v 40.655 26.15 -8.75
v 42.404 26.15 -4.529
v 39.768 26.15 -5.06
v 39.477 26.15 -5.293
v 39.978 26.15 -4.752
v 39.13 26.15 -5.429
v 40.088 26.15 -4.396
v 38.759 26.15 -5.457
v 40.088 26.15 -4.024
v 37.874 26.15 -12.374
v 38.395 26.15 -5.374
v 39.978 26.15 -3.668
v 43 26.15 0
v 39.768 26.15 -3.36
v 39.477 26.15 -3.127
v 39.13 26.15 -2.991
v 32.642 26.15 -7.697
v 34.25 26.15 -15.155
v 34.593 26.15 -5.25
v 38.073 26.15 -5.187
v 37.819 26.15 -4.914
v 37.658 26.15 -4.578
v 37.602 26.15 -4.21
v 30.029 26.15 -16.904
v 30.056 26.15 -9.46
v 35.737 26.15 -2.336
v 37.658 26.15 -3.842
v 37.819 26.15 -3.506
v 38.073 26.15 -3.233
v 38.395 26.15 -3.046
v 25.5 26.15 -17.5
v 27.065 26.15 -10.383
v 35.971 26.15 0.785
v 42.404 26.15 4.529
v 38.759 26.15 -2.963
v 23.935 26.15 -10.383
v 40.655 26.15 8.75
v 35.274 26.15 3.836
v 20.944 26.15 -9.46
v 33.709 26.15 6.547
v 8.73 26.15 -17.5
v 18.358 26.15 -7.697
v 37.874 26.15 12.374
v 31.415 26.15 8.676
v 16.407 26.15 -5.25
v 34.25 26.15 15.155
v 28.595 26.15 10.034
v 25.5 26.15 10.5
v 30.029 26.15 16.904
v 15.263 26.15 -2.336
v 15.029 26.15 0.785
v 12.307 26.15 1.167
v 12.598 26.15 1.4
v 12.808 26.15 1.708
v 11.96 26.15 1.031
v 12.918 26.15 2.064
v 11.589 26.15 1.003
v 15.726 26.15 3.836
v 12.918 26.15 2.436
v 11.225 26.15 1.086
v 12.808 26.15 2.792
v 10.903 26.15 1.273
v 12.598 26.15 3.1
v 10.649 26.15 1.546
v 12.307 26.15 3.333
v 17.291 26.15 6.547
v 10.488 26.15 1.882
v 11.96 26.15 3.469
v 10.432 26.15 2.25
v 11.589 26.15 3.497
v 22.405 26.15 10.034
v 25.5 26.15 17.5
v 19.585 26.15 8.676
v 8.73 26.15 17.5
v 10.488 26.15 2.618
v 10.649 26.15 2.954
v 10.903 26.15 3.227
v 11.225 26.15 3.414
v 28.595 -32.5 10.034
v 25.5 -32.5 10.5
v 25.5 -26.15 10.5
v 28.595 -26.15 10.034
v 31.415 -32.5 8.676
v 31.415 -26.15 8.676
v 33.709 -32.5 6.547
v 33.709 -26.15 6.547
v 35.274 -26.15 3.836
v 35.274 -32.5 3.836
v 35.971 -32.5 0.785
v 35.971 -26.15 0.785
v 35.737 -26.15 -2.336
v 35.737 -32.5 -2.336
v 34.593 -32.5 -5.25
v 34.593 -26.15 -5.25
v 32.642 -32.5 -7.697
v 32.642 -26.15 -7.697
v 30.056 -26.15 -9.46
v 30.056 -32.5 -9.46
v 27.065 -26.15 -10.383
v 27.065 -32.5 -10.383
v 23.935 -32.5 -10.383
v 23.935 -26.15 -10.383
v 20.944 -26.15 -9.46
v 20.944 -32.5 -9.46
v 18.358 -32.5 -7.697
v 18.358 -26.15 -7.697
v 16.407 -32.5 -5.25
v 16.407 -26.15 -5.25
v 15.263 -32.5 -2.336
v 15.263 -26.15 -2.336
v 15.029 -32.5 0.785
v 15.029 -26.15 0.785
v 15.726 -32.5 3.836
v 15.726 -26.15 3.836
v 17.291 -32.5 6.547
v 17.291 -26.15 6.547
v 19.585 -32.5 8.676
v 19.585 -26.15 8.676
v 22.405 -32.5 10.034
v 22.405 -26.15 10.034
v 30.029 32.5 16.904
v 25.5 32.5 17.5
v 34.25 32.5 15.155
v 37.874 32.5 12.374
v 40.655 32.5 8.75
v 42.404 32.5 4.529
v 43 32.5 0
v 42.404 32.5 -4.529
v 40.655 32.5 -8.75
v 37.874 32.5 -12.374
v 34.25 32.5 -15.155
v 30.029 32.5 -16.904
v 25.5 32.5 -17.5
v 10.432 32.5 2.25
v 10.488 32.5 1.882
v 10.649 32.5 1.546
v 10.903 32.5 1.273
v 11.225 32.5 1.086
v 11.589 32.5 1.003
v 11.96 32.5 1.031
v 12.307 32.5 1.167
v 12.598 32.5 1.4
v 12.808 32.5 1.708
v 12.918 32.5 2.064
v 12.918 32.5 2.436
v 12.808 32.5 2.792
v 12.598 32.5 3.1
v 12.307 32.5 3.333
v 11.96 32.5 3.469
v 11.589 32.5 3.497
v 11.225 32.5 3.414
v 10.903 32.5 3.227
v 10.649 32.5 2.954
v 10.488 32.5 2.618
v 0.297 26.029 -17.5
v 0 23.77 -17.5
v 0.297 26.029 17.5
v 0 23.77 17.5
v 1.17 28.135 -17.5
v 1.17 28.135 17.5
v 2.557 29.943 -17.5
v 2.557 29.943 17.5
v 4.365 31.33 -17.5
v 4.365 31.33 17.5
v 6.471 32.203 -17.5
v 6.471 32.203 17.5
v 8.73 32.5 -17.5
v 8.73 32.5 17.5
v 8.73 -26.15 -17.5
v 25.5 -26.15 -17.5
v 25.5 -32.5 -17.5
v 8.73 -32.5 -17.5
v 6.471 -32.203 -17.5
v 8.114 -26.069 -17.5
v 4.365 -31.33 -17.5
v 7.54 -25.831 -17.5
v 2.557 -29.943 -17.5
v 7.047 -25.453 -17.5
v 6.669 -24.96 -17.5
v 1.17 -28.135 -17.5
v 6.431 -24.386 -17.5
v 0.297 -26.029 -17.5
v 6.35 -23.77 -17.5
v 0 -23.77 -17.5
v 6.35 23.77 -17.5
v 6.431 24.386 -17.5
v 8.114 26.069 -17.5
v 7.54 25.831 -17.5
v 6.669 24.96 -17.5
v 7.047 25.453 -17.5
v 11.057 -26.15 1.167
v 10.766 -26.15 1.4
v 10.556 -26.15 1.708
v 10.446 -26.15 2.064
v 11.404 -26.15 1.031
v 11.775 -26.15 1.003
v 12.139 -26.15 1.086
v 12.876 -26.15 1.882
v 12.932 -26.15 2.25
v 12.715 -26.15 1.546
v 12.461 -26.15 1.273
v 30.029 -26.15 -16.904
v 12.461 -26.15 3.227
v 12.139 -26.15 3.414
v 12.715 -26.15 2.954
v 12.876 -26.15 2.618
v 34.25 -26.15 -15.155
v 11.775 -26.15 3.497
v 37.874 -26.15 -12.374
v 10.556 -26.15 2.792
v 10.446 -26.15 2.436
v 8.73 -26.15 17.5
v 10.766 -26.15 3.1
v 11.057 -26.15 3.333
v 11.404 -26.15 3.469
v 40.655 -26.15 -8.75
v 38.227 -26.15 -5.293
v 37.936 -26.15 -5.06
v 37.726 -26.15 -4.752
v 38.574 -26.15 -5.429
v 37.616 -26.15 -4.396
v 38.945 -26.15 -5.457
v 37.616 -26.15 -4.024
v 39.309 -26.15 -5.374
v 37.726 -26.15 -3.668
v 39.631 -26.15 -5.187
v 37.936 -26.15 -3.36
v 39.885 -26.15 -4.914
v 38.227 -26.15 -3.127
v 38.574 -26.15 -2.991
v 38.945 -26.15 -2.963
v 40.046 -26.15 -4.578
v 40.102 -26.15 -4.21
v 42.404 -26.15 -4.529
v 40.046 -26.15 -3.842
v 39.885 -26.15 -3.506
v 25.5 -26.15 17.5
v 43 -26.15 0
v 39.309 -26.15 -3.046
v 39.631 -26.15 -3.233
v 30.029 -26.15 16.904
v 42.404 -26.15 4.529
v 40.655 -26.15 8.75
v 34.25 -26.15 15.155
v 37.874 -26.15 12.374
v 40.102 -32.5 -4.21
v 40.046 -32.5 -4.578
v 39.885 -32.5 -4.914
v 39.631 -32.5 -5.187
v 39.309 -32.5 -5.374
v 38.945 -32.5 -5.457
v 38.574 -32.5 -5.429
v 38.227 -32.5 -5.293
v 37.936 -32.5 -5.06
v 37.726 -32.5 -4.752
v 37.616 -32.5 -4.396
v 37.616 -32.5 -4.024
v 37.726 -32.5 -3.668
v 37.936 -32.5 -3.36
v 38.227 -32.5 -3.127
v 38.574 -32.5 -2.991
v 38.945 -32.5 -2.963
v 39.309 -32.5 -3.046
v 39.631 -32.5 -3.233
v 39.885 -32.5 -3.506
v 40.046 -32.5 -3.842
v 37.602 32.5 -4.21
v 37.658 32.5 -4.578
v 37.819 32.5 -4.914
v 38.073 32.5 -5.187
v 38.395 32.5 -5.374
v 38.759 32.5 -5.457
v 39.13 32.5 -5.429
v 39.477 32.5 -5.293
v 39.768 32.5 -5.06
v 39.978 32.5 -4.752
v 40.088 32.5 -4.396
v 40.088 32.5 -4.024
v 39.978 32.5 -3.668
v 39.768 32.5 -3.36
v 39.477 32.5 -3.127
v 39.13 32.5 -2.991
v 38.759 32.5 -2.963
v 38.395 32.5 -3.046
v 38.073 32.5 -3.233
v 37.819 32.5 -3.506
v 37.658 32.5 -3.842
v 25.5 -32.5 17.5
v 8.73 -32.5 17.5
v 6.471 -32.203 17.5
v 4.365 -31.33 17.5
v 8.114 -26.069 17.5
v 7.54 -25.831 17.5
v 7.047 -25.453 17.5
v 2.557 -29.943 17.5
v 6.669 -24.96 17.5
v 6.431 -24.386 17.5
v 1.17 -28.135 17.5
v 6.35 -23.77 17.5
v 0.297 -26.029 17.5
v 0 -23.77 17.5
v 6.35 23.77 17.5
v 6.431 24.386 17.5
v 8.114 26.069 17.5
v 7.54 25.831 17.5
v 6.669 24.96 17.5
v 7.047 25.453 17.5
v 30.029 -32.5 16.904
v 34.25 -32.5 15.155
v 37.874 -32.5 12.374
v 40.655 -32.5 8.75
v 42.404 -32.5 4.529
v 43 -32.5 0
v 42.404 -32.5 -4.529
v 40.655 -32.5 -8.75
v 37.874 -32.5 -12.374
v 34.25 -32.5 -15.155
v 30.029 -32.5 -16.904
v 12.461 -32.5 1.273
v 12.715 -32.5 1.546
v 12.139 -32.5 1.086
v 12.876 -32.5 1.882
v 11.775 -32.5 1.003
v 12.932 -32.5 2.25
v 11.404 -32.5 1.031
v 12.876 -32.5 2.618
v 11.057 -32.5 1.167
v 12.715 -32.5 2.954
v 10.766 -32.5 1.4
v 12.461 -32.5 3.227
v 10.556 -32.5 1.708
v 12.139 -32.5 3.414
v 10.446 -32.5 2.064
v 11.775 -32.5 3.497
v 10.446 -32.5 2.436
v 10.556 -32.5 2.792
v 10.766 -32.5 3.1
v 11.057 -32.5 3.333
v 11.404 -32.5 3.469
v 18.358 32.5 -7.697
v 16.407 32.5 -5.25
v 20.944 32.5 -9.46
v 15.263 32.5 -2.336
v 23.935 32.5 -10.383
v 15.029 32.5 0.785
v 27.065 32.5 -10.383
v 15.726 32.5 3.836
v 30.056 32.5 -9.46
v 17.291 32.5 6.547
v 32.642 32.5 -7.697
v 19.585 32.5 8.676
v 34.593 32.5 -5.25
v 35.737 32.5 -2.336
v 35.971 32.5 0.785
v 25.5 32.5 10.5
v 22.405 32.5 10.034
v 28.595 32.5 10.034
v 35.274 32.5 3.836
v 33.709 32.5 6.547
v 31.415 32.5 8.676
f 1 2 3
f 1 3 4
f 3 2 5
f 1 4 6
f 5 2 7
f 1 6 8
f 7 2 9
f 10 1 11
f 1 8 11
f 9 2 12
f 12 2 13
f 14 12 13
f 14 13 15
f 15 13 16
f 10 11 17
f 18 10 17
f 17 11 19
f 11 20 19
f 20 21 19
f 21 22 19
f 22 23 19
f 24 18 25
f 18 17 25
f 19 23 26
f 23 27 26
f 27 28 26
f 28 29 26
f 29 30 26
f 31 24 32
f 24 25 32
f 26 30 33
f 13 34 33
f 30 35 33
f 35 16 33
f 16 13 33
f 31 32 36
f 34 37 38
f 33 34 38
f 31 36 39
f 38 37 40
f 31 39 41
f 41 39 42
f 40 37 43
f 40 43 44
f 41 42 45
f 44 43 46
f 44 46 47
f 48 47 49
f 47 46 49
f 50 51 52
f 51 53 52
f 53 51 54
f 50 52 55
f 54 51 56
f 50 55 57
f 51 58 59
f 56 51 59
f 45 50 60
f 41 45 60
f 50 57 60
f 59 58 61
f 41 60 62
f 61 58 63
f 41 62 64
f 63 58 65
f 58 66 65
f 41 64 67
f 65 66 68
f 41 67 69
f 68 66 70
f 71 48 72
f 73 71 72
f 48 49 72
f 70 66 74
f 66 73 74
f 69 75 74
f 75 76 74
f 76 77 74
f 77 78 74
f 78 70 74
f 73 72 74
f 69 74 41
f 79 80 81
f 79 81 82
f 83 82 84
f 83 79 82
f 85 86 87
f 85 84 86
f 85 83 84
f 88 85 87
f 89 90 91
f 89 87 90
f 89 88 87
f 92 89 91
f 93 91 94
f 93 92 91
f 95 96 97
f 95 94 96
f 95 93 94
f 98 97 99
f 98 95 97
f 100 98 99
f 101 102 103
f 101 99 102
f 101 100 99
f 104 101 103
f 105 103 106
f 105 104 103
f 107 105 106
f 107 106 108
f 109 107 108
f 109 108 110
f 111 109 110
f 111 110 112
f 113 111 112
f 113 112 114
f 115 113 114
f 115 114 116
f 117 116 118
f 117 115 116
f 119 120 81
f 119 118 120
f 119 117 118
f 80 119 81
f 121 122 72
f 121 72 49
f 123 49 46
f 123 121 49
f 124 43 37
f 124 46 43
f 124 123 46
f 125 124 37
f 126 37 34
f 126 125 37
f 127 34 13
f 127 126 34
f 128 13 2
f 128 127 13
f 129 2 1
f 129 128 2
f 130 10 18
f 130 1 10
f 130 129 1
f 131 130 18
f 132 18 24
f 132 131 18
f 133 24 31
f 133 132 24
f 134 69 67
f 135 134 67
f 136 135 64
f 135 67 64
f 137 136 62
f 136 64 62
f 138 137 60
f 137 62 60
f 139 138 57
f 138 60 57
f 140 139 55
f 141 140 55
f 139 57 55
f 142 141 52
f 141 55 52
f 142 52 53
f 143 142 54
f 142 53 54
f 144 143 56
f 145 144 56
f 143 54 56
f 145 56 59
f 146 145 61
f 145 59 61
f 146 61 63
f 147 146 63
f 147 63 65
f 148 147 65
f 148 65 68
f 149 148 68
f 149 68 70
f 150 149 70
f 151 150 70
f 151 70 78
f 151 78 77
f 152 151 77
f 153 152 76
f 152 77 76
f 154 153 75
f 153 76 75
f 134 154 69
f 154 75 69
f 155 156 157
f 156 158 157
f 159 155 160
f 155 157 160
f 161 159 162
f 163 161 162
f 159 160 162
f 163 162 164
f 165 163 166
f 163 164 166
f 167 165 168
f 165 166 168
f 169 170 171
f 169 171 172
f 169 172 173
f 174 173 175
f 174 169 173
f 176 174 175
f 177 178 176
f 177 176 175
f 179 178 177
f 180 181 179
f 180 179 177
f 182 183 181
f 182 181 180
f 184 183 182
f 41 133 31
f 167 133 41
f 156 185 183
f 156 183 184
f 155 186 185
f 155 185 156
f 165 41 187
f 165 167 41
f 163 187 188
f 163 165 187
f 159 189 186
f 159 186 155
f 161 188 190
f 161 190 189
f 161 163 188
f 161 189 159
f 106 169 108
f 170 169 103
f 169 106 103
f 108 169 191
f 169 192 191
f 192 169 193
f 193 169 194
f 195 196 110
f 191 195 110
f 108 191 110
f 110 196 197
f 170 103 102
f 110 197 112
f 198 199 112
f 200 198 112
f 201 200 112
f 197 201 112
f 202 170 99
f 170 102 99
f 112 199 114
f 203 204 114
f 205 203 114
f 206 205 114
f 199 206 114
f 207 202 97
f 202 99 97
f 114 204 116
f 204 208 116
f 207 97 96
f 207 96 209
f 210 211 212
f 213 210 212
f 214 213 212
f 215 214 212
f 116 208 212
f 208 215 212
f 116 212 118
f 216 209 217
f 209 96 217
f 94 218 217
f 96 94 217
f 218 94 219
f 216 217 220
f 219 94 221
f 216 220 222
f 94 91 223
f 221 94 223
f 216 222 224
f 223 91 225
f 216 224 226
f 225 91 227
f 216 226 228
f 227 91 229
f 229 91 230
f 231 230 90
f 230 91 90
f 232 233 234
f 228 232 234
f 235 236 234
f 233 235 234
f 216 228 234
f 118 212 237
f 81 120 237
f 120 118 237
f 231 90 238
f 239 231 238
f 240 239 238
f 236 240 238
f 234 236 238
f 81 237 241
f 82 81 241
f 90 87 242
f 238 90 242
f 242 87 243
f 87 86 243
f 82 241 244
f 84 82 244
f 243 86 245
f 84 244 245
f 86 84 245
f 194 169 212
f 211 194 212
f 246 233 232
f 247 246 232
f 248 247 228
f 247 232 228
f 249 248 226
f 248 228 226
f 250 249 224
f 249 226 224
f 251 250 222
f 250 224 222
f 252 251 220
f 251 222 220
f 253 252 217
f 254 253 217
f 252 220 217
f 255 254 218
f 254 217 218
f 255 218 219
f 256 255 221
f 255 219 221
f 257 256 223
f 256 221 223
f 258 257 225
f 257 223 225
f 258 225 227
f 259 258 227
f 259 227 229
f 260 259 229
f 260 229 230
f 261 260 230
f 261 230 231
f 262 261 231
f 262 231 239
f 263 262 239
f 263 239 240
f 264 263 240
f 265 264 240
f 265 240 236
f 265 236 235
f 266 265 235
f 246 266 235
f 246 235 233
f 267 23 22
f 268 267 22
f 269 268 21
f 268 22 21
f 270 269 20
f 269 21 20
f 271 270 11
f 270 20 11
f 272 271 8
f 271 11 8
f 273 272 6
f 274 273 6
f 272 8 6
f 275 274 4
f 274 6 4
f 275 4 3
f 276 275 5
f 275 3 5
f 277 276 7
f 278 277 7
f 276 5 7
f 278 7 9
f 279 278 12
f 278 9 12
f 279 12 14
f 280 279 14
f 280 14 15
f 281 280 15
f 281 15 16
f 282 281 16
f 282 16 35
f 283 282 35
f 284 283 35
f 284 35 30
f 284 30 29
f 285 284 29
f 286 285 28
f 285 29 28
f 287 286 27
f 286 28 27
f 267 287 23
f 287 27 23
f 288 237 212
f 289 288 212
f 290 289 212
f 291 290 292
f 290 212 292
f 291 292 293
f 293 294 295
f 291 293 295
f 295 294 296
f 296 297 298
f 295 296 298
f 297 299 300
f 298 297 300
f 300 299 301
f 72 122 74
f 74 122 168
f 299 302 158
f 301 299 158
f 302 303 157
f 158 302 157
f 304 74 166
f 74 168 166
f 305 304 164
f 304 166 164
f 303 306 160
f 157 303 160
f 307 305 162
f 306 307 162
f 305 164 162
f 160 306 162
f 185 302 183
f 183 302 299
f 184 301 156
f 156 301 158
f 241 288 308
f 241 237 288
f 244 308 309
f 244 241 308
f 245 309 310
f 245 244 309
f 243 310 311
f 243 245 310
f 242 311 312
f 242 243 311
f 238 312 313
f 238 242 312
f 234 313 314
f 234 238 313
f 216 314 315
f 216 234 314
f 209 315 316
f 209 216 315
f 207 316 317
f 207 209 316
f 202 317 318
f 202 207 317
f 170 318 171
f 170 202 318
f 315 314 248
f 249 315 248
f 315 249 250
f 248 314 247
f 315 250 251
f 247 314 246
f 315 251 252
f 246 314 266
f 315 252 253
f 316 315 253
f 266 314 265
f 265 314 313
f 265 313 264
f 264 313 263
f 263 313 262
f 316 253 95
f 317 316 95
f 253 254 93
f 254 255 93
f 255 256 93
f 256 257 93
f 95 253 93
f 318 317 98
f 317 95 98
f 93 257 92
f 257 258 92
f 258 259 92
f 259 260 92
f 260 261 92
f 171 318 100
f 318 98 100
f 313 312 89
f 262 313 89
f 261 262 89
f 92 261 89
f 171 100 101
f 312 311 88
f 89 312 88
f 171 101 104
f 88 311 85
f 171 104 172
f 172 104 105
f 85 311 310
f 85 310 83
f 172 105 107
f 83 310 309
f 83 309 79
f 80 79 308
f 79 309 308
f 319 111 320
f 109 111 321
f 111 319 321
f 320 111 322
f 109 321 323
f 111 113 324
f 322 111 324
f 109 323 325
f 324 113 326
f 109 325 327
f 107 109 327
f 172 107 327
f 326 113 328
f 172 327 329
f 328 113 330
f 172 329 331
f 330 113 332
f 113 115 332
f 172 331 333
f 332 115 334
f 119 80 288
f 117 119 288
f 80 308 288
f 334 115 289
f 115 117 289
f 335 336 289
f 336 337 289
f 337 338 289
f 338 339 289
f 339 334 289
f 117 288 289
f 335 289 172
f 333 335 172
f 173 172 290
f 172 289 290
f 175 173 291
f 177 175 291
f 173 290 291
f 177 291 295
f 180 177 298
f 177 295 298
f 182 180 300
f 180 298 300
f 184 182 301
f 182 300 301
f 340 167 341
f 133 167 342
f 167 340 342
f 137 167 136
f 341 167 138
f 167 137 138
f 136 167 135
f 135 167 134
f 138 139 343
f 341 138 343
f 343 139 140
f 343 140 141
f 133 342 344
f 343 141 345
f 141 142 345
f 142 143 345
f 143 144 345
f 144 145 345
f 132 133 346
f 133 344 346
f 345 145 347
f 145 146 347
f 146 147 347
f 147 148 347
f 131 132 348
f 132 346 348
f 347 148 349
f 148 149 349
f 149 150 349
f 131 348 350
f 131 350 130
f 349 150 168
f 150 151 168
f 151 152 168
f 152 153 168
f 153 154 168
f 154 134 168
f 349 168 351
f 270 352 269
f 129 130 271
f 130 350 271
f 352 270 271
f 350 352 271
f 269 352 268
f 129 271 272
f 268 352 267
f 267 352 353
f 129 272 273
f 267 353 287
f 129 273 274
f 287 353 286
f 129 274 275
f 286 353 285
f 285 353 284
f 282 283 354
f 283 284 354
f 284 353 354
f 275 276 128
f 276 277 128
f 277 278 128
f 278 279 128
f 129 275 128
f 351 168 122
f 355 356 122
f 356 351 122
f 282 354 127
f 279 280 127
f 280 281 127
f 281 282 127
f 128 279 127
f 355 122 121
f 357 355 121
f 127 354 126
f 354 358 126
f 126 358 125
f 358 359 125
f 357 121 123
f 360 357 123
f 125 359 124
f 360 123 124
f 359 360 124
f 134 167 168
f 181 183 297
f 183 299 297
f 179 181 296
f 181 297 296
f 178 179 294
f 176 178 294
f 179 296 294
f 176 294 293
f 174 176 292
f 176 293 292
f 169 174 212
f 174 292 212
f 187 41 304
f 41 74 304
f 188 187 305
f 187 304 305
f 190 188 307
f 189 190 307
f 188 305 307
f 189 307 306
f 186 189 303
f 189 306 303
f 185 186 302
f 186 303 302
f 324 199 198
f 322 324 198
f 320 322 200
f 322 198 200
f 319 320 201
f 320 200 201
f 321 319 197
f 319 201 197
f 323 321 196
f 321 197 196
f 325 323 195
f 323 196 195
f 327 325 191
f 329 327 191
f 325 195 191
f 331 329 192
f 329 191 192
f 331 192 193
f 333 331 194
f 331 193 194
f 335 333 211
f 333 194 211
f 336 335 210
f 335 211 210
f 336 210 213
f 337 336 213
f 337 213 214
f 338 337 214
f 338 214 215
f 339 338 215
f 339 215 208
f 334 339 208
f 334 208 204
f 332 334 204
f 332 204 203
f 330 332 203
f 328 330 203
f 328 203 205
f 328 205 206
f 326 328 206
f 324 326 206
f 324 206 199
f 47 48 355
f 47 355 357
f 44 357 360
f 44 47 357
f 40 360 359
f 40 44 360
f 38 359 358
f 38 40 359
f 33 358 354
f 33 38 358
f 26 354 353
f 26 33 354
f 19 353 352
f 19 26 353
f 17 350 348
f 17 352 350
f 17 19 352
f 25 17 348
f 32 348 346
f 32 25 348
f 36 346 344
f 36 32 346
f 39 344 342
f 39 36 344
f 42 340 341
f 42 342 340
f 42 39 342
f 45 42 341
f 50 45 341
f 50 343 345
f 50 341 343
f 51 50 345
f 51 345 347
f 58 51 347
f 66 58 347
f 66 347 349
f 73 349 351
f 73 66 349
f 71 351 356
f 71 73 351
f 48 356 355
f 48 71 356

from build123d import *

# Parameters (mm, degrees)
BASE_FLANGE1_DEPTH        = 17.5
FILLET3_RADIUS            = 17.5
FILLET3_LENGTH            = 6.35
FILLET4_RADIUS            = 17.5
FILLET4_LENGTH            = 6.35
CUT_EXTRUDE6_DEPTH        = 57.670097935
CUT_EXTRUDE6_DEPTH_BACK   = 57.670097935
SKETCH23_R                = 10.5
M3X0_5_TAPPED_HOLE1_D     = 2.5
M3X0_5_TAPPED_HOLE1_DEPTH = 6.35
M3X0_5_TAPPED_HOLE2_D     = 2.5


# Sheet-metal steps are written as plain solids
with BuildPart() as part:
    # Sketch20 → Base-Flange1 (new, symmetric)
    with BuildSketch(Plane.XY):
        with BuildLine():
            Line((43, -32.5), (8.730000066, -32.5))
            ThreePointArc((8.730000066, -32.5), (2.55695782, -29.94304218), (0, -23.769999934))
            Line((0, -23.769999934), (0, 23.769999934))
            ThreePointArc((0, 23.769999934), (2.55695782, 29.94304218), (8.730000066, 32.5))
            Line((8.730000066, 32.5), (43, 32.5))
            Line((43, 32.5), (43, 26.15))
            Line((43, 26.15), (8.730000066, 26.15))
            ThreePointArc((8.730000066, 26.15), (7.04708588, 25.45291412), (6.35, 23.769999934))
            Line((6.35, 23.769999934), (6.35, -23.769999934))
            ThreePointArc((6.35, -23.769999934), (7.04708588, -25.45291412), (8.730000066, -26.15))
            Line((8.730000066, -26.15), (43, -26.15))
            Line((43, -26.15), (43, -32.5))
        make_face()
    extrude(amount=BASE_FLANGE1_DEPTH, both=True)

    # Fillet3: full round fillet: the end face becomes a half cylinder, R = half its width
    fillet3_face = Plane((43, 29.325, 0), x_dir=(0, 1, 0), z_dir=(1, 0, 0))  # on the end face: x along it, z out of the body
    fillet3_slab = fillet3_face.offset(-FILLET3_RADIUS / 2) * Box(FILLET3_LENGTH, 2 * FILLET3_RADIUS, FILLET3_RADIUS, mode=Mode.PRIVATE)  # the body's end, R deep
    fillet3_round = Plane((25.5, 29.325, 0), x_dir=(1, 0, 0), z_dir=(0, 1, 0)) * Cylinder(FILLET3_RADIUS, FILLET3_LENGTH, mode=Mode.PRIVATE)  # its axis R under the face
    add(fillet3_slab - fillet3_round, mode=Mode.SUBTRACT)

    # Fillet4: full round fillet: the end face becomes a half cylinder, R = half its width
    fillet4_face = Plane((43, -29.325, 0), x_dir=(0, 1, 0), z_dir=(1, 0, 0))  # on the end face: x along it, z out of the body
    fillet4_slab = fillet4_face.offset(-FILLET4_RADIUS / 2) * Box(FILLET4_LENGTH, 2 * FILLET4_RADIUS, FILLET4_RADIUS, mode=Mode.PRIVATE)  # the body's end, R deep
    fillet4_round = Plane((25.5, -29.325, 0), x_dir=(1, 0, 0), z_dir=(0, 1, 0)) * Cylinder(FILLET4_RADIUS, FILLET4_LENGTH, mode=Mode.PRIVATE)  # its axis R under the face
    add(fillet4_slab - fillet4_round, mode=Mode.SUBTRACT)

    # Sketch23 → Cut-Extrude6 (cut, two sides: drawn at the far end of the back side and taken through both)
    with BuildSketch(Plane(origin=(0, 0, 0), x_dir=(1, 0, 0), z_dir=(0, 1, 0)).offset(-CUT_EXTRUDE6_DEPTH_BACK)):
        with Locations(Location((25.5, 0, 0), (0, 0, 270))):
            Circle(SKETCH23_R)
    extrude(amount=CUT_EXTRUDE6_DEPTH + CUT_EXTRUDE6_DEPTH_BACK, mode=Mode.SUBTRACT)

    # M3x0.5 Tapped Hole1
    with Locations(Plane(origin=(0, 32.5, 0), x_dir=(1, 0, 0), z_dir=(0, 1, 0))):
        with Locations((38.85199985, 4.21), (11.681986395, -2.25)):
            Hole(M3X0_5_TAPPED_HOLE1_D / 2, depth=M3X0_5_TAPPED_HOLE1_DEPTH)

    # M3x0.5 Tapped Hole2 (through all)
    with Locations(Plane(origin=(0, -32.5, 0), x_dir=(-1, 0, 0), z_dir=(0, -1, 0))):
        with Locations((-11.681986395, -2.25), (-38.85199985, 4.21)):
            Hole(M3X0_5_TAPPED_HOLE2_D / 2)


solid = part.part
